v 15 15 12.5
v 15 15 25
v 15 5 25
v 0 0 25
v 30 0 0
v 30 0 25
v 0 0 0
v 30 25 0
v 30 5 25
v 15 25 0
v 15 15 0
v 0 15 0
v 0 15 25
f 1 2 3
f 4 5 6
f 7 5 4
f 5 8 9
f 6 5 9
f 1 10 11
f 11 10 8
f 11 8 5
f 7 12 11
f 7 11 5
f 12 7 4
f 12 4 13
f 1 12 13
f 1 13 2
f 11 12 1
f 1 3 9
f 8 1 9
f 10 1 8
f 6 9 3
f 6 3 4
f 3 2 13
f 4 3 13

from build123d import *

# Parameters (mm, degrees)
BOSS_EXTRUDE1_DEPTH = 25
BOSS_EXTRUDE2_DEPTH = 15


with BuildPart() as part:
    # Sketch1 → Boss-Extrude1 (new body)
    with BuildSketch(Plane.XY):
        Polygon((0, 0), (0, 15), (15, 15), (15, 5), (30, 5), (30, 0), align=None)
    extrude(amount=BOSS_EXTRUDE1_DEPTH)

    # Sketch2 → Boss-Extrude2 (add)
    with BuildSketch(Plane(origin=(15, 0, 0), x_dir=(0, 0, -1), z_dir=(1, 0, 0))):
        Polygon((-25, 5), (0, 25), (0, 5), align=None)
    extrude(amount=BOSS_EXTRUDE2_DEPTH)


solid = part.part
